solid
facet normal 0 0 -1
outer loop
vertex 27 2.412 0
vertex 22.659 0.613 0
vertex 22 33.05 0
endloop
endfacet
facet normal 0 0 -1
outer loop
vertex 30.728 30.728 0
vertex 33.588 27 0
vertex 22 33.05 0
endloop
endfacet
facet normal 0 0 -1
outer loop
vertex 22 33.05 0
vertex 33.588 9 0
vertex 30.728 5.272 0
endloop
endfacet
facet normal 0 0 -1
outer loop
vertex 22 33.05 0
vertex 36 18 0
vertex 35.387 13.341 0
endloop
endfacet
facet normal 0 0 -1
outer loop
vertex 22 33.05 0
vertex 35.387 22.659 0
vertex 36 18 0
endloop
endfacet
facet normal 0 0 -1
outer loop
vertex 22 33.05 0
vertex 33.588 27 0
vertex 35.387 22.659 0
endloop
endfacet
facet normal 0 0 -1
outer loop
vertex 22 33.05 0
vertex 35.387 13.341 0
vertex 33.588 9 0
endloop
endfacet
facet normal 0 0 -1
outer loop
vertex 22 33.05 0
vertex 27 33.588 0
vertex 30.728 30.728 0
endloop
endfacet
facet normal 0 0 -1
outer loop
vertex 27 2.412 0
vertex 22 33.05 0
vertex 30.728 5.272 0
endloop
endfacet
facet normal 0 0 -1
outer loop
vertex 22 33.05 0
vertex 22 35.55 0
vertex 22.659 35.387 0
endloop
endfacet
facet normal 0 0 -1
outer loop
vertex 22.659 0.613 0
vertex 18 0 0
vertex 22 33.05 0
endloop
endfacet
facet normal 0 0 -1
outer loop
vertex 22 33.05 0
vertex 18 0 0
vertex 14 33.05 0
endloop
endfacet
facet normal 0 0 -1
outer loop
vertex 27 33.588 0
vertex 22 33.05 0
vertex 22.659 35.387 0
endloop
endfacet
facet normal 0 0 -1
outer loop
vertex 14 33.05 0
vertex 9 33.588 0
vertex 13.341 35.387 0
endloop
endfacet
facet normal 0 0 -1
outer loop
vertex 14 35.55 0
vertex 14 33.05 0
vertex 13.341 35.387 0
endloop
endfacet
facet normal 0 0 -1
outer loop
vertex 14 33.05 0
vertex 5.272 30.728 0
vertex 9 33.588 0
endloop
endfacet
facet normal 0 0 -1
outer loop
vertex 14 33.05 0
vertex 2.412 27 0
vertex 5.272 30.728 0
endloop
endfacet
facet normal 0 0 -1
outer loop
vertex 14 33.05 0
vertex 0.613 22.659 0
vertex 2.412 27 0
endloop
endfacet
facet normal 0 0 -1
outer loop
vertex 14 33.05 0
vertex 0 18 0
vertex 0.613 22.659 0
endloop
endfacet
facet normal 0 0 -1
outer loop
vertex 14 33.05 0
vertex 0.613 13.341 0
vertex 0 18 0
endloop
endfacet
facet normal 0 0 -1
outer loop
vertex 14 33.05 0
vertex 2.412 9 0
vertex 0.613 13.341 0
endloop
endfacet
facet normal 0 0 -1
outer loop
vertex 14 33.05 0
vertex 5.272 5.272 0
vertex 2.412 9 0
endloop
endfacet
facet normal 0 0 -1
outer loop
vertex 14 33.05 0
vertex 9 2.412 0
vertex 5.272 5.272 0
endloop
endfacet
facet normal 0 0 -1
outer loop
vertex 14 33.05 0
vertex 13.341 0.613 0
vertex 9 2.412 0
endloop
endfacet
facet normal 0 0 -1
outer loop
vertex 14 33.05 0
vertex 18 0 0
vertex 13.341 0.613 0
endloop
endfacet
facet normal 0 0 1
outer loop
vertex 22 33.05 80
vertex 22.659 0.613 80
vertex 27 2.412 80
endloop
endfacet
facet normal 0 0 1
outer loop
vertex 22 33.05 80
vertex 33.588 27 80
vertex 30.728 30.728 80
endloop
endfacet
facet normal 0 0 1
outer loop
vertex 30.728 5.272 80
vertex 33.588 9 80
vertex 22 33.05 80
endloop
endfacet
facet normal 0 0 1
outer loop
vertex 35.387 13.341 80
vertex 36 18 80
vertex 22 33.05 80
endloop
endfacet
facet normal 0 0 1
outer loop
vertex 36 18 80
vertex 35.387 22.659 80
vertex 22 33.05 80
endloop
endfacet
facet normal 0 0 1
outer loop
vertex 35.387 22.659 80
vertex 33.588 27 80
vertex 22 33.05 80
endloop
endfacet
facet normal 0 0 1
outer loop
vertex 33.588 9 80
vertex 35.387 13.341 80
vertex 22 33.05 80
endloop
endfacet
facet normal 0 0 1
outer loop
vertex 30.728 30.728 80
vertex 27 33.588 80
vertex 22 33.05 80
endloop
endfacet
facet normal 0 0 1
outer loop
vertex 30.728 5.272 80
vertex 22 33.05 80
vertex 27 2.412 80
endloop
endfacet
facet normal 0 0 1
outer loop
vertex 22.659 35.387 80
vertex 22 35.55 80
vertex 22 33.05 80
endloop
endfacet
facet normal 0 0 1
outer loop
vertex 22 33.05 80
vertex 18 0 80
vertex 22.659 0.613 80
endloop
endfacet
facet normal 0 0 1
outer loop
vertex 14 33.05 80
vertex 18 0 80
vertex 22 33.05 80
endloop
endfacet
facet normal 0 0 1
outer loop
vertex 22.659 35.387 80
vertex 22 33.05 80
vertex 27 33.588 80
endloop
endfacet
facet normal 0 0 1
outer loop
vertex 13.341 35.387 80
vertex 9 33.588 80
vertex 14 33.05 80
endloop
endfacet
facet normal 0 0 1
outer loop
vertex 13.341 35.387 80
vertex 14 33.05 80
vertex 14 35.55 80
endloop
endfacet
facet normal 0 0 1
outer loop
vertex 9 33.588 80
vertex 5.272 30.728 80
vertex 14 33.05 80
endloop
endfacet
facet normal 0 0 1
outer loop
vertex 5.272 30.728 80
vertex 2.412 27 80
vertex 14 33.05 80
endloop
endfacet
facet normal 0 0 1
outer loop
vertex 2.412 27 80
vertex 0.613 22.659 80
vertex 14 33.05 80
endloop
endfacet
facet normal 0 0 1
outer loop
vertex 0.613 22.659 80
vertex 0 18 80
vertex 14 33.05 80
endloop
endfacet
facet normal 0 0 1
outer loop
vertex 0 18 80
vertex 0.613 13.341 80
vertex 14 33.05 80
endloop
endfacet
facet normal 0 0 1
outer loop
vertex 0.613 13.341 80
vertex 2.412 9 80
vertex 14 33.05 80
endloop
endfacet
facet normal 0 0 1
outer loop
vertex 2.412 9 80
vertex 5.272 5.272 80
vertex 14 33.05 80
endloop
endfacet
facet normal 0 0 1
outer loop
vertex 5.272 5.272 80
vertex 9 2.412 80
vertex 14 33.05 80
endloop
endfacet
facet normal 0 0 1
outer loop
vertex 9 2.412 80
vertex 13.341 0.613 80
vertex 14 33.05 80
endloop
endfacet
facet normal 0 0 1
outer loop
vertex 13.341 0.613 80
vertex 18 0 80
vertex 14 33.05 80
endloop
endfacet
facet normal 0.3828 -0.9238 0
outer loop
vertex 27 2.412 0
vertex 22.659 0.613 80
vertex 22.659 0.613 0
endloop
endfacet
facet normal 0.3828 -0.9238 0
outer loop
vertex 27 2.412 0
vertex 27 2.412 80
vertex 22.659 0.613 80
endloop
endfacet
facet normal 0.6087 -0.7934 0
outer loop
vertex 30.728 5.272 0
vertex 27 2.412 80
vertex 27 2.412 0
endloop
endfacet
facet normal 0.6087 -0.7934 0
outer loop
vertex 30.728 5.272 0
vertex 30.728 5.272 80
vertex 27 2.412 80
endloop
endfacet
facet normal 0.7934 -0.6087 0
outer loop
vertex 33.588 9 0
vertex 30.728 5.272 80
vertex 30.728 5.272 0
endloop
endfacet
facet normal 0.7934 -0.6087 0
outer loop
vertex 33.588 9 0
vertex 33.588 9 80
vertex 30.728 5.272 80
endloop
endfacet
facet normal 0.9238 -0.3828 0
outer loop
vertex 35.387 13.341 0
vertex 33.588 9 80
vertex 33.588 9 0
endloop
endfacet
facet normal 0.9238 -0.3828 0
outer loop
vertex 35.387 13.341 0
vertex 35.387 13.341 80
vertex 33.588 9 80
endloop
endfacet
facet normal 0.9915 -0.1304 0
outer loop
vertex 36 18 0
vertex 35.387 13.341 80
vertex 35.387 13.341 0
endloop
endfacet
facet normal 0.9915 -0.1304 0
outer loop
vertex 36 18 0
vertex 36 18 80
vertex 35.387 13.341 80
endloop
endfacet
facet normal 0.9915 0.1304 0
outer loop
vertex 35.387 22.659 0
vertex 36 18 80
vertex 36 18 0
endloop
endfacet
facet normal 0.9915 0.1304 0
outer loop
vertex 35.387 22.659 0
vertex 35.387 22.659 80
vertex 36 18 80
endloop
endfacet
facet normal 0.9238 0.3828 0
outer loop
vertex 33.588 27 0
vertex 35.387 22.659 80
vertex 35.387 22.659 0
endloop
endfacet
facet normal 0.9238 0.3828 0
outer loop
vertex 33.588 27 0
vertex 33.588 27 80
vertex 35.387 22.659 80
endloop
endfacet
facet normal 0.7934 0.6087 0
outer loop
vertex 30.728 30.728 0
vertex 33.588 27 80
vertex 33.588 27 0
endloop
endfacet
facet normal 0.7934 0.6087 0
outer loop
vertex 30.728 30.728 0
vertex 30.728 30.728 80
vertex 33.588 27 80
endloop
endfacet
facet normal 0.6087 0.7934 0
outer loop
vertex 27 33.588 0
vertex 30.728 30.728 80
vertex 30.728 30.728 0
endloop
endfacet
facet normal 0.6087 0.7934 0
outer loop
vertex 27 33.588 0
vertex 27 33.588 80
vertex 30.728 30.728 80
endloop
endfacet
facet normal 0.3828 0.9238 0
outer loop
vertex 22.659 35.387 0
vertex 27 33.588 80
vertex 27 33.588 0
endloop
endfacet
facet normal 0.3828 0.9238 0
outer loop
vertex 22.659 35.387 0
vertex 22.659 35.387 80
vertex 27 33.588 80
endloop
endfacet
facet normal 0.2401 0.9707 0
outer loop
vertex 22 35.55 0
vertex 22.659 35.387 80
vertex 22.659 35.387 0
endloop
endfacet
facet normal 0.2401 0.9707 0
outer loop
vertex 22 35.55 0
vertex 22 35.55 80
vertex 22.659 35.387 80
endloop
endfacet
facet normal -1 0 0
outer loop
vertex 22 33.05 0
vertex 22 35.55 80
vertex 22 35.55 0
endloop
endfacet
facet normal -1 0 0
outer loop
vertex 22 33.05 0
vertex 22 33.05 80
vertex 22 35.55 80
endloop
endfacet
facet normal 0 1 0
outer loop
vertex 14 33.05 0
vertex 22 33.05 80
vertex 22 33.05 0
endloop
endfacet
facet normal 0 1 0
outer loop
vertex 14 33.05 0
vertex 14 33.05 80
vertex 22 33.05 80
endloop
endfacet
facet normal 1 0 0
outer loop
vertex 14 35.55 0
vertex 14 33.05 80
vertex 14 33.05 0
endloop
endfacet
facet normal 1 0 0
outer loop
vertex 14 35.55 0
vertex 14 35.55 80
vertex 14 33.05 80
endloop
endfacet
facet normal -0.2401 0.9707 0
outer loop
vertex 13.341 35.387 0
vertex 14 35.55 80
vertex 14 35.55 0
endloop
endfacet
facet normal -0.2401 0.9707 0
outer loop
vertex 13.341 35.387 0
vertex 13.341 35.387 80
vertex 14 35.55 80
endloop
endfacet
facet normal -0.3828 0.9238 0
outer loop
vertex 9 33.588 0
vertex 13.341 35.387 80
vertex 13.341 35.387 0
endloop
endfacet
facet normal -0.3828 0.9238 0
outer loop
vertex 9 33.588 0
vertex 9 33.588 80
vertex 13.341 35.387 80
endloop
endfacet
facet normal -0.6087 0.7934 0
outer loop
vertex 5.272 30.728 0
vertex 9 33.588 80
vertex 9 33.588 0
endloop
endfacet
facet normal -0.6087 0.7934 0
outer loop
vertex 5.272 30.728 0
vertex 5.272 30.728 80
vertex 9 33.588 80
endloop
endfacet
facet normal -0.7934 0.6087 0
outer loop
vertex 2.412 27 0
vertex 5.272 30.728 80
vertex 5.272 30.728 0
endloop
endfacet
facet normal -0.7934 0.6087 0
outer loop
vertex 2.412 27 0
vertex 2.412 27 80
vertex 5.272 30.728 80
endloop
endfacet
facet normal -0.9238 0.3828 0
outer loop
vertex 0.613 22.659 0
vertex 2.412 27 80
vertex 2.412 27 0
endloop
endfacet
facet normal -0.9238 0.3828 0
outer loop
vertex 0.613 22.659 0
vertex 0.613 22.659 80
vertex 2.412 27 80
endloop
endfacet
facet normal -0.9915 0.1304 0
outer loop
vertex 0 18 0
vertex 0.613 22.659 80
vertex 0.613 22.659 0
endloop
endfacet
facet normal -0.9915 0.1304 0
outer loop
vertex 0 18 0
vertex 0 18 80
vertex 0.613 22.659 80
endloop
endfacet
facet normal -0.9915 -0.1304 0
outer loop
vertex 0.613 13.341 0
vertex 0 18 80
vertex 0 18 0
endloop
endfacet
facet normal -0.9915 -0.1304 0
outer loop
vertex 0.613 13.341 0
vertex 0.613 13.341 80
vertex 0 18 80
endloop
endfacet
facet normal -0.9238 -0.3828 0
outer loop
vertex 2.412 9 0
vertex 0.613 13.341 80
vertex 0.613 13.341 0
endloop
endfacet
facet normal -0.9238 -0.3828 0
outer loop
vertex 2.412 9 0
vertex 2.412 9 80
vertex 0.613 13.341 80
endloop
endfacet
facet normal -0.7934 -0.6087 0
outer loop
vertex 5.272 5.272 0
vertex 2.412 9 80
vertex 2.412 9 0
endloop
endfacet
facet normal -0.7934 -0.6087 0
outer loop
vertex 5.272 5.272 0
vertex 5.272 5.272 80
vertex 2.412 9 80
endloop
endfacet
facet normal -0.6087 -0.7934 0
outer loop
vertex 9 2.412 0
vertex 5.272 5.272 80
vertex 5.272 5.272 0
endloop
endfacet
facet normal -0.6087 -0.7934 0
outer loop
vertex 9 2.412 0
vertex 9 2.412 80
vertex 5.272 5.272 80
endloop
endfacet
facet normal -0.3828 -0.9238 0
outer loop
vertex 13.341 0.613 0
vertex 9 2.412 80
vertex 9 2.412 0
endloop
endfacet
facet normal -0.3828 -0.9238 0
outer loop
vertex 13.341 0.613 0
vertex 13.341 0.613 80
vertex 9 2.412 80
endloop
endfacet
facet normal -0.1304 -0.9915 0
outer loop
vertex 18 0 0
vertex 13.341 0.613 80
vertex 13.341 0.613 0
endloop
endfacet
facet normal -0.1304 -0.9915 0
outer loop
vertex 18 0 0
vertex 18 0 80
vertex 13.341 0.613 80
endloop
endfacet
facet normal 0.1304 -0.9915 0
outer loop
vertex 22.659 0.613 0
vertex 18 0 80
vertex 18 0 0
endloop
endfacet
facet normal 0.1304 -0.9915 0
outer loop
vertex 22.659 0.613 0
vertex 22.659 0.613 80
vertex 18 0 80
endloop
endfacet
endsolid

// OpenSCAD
$fn = 32;

// ----------------------------------------------------------------------
// Keyway shaft: d36 shaft, key 8 x 2.5 mm
// ----------------------------------------------------------------------

// --- parameters (mm) ---
shaft_r = 18;             // shaft radius
key_w = 8;                // keyway width
key_d = 2.5;              // keyway depth below the surface line
plate_t = 80;             // shaft length, Z (extrusion height)

shaft_d = 2 * shaft_r;  // shaft diameter
circle_step = 15;  // polygon sampling step, degrees

profile = [[13.341, 35.387], [9, 33.588], [5.272, 30.728], [2.412, 27], [0.613, 22.659], [0, 18], [0.613, 13.341], [2.412, 9], [5.272, 5.272], [9, 2.412], [13.341, 0.613], [18, 0], [22.659, 0.613], [27, 2.412], [30.728, 5.272], [33.588, 9], [35.387, 13.341], [36, 18], [35.387, 22.659], [33.588, 27], [30.728, 30.728], [27, 33.588], [22.659, 35.387], [22, 35.55], [22, 33.05], [14, 33.05], [14, 35.55]];  // primary outline, 27 points, counter clockwise

// --- the one profile operation ---
linear_extrude(height = plate_t) polygon(points = profile);
